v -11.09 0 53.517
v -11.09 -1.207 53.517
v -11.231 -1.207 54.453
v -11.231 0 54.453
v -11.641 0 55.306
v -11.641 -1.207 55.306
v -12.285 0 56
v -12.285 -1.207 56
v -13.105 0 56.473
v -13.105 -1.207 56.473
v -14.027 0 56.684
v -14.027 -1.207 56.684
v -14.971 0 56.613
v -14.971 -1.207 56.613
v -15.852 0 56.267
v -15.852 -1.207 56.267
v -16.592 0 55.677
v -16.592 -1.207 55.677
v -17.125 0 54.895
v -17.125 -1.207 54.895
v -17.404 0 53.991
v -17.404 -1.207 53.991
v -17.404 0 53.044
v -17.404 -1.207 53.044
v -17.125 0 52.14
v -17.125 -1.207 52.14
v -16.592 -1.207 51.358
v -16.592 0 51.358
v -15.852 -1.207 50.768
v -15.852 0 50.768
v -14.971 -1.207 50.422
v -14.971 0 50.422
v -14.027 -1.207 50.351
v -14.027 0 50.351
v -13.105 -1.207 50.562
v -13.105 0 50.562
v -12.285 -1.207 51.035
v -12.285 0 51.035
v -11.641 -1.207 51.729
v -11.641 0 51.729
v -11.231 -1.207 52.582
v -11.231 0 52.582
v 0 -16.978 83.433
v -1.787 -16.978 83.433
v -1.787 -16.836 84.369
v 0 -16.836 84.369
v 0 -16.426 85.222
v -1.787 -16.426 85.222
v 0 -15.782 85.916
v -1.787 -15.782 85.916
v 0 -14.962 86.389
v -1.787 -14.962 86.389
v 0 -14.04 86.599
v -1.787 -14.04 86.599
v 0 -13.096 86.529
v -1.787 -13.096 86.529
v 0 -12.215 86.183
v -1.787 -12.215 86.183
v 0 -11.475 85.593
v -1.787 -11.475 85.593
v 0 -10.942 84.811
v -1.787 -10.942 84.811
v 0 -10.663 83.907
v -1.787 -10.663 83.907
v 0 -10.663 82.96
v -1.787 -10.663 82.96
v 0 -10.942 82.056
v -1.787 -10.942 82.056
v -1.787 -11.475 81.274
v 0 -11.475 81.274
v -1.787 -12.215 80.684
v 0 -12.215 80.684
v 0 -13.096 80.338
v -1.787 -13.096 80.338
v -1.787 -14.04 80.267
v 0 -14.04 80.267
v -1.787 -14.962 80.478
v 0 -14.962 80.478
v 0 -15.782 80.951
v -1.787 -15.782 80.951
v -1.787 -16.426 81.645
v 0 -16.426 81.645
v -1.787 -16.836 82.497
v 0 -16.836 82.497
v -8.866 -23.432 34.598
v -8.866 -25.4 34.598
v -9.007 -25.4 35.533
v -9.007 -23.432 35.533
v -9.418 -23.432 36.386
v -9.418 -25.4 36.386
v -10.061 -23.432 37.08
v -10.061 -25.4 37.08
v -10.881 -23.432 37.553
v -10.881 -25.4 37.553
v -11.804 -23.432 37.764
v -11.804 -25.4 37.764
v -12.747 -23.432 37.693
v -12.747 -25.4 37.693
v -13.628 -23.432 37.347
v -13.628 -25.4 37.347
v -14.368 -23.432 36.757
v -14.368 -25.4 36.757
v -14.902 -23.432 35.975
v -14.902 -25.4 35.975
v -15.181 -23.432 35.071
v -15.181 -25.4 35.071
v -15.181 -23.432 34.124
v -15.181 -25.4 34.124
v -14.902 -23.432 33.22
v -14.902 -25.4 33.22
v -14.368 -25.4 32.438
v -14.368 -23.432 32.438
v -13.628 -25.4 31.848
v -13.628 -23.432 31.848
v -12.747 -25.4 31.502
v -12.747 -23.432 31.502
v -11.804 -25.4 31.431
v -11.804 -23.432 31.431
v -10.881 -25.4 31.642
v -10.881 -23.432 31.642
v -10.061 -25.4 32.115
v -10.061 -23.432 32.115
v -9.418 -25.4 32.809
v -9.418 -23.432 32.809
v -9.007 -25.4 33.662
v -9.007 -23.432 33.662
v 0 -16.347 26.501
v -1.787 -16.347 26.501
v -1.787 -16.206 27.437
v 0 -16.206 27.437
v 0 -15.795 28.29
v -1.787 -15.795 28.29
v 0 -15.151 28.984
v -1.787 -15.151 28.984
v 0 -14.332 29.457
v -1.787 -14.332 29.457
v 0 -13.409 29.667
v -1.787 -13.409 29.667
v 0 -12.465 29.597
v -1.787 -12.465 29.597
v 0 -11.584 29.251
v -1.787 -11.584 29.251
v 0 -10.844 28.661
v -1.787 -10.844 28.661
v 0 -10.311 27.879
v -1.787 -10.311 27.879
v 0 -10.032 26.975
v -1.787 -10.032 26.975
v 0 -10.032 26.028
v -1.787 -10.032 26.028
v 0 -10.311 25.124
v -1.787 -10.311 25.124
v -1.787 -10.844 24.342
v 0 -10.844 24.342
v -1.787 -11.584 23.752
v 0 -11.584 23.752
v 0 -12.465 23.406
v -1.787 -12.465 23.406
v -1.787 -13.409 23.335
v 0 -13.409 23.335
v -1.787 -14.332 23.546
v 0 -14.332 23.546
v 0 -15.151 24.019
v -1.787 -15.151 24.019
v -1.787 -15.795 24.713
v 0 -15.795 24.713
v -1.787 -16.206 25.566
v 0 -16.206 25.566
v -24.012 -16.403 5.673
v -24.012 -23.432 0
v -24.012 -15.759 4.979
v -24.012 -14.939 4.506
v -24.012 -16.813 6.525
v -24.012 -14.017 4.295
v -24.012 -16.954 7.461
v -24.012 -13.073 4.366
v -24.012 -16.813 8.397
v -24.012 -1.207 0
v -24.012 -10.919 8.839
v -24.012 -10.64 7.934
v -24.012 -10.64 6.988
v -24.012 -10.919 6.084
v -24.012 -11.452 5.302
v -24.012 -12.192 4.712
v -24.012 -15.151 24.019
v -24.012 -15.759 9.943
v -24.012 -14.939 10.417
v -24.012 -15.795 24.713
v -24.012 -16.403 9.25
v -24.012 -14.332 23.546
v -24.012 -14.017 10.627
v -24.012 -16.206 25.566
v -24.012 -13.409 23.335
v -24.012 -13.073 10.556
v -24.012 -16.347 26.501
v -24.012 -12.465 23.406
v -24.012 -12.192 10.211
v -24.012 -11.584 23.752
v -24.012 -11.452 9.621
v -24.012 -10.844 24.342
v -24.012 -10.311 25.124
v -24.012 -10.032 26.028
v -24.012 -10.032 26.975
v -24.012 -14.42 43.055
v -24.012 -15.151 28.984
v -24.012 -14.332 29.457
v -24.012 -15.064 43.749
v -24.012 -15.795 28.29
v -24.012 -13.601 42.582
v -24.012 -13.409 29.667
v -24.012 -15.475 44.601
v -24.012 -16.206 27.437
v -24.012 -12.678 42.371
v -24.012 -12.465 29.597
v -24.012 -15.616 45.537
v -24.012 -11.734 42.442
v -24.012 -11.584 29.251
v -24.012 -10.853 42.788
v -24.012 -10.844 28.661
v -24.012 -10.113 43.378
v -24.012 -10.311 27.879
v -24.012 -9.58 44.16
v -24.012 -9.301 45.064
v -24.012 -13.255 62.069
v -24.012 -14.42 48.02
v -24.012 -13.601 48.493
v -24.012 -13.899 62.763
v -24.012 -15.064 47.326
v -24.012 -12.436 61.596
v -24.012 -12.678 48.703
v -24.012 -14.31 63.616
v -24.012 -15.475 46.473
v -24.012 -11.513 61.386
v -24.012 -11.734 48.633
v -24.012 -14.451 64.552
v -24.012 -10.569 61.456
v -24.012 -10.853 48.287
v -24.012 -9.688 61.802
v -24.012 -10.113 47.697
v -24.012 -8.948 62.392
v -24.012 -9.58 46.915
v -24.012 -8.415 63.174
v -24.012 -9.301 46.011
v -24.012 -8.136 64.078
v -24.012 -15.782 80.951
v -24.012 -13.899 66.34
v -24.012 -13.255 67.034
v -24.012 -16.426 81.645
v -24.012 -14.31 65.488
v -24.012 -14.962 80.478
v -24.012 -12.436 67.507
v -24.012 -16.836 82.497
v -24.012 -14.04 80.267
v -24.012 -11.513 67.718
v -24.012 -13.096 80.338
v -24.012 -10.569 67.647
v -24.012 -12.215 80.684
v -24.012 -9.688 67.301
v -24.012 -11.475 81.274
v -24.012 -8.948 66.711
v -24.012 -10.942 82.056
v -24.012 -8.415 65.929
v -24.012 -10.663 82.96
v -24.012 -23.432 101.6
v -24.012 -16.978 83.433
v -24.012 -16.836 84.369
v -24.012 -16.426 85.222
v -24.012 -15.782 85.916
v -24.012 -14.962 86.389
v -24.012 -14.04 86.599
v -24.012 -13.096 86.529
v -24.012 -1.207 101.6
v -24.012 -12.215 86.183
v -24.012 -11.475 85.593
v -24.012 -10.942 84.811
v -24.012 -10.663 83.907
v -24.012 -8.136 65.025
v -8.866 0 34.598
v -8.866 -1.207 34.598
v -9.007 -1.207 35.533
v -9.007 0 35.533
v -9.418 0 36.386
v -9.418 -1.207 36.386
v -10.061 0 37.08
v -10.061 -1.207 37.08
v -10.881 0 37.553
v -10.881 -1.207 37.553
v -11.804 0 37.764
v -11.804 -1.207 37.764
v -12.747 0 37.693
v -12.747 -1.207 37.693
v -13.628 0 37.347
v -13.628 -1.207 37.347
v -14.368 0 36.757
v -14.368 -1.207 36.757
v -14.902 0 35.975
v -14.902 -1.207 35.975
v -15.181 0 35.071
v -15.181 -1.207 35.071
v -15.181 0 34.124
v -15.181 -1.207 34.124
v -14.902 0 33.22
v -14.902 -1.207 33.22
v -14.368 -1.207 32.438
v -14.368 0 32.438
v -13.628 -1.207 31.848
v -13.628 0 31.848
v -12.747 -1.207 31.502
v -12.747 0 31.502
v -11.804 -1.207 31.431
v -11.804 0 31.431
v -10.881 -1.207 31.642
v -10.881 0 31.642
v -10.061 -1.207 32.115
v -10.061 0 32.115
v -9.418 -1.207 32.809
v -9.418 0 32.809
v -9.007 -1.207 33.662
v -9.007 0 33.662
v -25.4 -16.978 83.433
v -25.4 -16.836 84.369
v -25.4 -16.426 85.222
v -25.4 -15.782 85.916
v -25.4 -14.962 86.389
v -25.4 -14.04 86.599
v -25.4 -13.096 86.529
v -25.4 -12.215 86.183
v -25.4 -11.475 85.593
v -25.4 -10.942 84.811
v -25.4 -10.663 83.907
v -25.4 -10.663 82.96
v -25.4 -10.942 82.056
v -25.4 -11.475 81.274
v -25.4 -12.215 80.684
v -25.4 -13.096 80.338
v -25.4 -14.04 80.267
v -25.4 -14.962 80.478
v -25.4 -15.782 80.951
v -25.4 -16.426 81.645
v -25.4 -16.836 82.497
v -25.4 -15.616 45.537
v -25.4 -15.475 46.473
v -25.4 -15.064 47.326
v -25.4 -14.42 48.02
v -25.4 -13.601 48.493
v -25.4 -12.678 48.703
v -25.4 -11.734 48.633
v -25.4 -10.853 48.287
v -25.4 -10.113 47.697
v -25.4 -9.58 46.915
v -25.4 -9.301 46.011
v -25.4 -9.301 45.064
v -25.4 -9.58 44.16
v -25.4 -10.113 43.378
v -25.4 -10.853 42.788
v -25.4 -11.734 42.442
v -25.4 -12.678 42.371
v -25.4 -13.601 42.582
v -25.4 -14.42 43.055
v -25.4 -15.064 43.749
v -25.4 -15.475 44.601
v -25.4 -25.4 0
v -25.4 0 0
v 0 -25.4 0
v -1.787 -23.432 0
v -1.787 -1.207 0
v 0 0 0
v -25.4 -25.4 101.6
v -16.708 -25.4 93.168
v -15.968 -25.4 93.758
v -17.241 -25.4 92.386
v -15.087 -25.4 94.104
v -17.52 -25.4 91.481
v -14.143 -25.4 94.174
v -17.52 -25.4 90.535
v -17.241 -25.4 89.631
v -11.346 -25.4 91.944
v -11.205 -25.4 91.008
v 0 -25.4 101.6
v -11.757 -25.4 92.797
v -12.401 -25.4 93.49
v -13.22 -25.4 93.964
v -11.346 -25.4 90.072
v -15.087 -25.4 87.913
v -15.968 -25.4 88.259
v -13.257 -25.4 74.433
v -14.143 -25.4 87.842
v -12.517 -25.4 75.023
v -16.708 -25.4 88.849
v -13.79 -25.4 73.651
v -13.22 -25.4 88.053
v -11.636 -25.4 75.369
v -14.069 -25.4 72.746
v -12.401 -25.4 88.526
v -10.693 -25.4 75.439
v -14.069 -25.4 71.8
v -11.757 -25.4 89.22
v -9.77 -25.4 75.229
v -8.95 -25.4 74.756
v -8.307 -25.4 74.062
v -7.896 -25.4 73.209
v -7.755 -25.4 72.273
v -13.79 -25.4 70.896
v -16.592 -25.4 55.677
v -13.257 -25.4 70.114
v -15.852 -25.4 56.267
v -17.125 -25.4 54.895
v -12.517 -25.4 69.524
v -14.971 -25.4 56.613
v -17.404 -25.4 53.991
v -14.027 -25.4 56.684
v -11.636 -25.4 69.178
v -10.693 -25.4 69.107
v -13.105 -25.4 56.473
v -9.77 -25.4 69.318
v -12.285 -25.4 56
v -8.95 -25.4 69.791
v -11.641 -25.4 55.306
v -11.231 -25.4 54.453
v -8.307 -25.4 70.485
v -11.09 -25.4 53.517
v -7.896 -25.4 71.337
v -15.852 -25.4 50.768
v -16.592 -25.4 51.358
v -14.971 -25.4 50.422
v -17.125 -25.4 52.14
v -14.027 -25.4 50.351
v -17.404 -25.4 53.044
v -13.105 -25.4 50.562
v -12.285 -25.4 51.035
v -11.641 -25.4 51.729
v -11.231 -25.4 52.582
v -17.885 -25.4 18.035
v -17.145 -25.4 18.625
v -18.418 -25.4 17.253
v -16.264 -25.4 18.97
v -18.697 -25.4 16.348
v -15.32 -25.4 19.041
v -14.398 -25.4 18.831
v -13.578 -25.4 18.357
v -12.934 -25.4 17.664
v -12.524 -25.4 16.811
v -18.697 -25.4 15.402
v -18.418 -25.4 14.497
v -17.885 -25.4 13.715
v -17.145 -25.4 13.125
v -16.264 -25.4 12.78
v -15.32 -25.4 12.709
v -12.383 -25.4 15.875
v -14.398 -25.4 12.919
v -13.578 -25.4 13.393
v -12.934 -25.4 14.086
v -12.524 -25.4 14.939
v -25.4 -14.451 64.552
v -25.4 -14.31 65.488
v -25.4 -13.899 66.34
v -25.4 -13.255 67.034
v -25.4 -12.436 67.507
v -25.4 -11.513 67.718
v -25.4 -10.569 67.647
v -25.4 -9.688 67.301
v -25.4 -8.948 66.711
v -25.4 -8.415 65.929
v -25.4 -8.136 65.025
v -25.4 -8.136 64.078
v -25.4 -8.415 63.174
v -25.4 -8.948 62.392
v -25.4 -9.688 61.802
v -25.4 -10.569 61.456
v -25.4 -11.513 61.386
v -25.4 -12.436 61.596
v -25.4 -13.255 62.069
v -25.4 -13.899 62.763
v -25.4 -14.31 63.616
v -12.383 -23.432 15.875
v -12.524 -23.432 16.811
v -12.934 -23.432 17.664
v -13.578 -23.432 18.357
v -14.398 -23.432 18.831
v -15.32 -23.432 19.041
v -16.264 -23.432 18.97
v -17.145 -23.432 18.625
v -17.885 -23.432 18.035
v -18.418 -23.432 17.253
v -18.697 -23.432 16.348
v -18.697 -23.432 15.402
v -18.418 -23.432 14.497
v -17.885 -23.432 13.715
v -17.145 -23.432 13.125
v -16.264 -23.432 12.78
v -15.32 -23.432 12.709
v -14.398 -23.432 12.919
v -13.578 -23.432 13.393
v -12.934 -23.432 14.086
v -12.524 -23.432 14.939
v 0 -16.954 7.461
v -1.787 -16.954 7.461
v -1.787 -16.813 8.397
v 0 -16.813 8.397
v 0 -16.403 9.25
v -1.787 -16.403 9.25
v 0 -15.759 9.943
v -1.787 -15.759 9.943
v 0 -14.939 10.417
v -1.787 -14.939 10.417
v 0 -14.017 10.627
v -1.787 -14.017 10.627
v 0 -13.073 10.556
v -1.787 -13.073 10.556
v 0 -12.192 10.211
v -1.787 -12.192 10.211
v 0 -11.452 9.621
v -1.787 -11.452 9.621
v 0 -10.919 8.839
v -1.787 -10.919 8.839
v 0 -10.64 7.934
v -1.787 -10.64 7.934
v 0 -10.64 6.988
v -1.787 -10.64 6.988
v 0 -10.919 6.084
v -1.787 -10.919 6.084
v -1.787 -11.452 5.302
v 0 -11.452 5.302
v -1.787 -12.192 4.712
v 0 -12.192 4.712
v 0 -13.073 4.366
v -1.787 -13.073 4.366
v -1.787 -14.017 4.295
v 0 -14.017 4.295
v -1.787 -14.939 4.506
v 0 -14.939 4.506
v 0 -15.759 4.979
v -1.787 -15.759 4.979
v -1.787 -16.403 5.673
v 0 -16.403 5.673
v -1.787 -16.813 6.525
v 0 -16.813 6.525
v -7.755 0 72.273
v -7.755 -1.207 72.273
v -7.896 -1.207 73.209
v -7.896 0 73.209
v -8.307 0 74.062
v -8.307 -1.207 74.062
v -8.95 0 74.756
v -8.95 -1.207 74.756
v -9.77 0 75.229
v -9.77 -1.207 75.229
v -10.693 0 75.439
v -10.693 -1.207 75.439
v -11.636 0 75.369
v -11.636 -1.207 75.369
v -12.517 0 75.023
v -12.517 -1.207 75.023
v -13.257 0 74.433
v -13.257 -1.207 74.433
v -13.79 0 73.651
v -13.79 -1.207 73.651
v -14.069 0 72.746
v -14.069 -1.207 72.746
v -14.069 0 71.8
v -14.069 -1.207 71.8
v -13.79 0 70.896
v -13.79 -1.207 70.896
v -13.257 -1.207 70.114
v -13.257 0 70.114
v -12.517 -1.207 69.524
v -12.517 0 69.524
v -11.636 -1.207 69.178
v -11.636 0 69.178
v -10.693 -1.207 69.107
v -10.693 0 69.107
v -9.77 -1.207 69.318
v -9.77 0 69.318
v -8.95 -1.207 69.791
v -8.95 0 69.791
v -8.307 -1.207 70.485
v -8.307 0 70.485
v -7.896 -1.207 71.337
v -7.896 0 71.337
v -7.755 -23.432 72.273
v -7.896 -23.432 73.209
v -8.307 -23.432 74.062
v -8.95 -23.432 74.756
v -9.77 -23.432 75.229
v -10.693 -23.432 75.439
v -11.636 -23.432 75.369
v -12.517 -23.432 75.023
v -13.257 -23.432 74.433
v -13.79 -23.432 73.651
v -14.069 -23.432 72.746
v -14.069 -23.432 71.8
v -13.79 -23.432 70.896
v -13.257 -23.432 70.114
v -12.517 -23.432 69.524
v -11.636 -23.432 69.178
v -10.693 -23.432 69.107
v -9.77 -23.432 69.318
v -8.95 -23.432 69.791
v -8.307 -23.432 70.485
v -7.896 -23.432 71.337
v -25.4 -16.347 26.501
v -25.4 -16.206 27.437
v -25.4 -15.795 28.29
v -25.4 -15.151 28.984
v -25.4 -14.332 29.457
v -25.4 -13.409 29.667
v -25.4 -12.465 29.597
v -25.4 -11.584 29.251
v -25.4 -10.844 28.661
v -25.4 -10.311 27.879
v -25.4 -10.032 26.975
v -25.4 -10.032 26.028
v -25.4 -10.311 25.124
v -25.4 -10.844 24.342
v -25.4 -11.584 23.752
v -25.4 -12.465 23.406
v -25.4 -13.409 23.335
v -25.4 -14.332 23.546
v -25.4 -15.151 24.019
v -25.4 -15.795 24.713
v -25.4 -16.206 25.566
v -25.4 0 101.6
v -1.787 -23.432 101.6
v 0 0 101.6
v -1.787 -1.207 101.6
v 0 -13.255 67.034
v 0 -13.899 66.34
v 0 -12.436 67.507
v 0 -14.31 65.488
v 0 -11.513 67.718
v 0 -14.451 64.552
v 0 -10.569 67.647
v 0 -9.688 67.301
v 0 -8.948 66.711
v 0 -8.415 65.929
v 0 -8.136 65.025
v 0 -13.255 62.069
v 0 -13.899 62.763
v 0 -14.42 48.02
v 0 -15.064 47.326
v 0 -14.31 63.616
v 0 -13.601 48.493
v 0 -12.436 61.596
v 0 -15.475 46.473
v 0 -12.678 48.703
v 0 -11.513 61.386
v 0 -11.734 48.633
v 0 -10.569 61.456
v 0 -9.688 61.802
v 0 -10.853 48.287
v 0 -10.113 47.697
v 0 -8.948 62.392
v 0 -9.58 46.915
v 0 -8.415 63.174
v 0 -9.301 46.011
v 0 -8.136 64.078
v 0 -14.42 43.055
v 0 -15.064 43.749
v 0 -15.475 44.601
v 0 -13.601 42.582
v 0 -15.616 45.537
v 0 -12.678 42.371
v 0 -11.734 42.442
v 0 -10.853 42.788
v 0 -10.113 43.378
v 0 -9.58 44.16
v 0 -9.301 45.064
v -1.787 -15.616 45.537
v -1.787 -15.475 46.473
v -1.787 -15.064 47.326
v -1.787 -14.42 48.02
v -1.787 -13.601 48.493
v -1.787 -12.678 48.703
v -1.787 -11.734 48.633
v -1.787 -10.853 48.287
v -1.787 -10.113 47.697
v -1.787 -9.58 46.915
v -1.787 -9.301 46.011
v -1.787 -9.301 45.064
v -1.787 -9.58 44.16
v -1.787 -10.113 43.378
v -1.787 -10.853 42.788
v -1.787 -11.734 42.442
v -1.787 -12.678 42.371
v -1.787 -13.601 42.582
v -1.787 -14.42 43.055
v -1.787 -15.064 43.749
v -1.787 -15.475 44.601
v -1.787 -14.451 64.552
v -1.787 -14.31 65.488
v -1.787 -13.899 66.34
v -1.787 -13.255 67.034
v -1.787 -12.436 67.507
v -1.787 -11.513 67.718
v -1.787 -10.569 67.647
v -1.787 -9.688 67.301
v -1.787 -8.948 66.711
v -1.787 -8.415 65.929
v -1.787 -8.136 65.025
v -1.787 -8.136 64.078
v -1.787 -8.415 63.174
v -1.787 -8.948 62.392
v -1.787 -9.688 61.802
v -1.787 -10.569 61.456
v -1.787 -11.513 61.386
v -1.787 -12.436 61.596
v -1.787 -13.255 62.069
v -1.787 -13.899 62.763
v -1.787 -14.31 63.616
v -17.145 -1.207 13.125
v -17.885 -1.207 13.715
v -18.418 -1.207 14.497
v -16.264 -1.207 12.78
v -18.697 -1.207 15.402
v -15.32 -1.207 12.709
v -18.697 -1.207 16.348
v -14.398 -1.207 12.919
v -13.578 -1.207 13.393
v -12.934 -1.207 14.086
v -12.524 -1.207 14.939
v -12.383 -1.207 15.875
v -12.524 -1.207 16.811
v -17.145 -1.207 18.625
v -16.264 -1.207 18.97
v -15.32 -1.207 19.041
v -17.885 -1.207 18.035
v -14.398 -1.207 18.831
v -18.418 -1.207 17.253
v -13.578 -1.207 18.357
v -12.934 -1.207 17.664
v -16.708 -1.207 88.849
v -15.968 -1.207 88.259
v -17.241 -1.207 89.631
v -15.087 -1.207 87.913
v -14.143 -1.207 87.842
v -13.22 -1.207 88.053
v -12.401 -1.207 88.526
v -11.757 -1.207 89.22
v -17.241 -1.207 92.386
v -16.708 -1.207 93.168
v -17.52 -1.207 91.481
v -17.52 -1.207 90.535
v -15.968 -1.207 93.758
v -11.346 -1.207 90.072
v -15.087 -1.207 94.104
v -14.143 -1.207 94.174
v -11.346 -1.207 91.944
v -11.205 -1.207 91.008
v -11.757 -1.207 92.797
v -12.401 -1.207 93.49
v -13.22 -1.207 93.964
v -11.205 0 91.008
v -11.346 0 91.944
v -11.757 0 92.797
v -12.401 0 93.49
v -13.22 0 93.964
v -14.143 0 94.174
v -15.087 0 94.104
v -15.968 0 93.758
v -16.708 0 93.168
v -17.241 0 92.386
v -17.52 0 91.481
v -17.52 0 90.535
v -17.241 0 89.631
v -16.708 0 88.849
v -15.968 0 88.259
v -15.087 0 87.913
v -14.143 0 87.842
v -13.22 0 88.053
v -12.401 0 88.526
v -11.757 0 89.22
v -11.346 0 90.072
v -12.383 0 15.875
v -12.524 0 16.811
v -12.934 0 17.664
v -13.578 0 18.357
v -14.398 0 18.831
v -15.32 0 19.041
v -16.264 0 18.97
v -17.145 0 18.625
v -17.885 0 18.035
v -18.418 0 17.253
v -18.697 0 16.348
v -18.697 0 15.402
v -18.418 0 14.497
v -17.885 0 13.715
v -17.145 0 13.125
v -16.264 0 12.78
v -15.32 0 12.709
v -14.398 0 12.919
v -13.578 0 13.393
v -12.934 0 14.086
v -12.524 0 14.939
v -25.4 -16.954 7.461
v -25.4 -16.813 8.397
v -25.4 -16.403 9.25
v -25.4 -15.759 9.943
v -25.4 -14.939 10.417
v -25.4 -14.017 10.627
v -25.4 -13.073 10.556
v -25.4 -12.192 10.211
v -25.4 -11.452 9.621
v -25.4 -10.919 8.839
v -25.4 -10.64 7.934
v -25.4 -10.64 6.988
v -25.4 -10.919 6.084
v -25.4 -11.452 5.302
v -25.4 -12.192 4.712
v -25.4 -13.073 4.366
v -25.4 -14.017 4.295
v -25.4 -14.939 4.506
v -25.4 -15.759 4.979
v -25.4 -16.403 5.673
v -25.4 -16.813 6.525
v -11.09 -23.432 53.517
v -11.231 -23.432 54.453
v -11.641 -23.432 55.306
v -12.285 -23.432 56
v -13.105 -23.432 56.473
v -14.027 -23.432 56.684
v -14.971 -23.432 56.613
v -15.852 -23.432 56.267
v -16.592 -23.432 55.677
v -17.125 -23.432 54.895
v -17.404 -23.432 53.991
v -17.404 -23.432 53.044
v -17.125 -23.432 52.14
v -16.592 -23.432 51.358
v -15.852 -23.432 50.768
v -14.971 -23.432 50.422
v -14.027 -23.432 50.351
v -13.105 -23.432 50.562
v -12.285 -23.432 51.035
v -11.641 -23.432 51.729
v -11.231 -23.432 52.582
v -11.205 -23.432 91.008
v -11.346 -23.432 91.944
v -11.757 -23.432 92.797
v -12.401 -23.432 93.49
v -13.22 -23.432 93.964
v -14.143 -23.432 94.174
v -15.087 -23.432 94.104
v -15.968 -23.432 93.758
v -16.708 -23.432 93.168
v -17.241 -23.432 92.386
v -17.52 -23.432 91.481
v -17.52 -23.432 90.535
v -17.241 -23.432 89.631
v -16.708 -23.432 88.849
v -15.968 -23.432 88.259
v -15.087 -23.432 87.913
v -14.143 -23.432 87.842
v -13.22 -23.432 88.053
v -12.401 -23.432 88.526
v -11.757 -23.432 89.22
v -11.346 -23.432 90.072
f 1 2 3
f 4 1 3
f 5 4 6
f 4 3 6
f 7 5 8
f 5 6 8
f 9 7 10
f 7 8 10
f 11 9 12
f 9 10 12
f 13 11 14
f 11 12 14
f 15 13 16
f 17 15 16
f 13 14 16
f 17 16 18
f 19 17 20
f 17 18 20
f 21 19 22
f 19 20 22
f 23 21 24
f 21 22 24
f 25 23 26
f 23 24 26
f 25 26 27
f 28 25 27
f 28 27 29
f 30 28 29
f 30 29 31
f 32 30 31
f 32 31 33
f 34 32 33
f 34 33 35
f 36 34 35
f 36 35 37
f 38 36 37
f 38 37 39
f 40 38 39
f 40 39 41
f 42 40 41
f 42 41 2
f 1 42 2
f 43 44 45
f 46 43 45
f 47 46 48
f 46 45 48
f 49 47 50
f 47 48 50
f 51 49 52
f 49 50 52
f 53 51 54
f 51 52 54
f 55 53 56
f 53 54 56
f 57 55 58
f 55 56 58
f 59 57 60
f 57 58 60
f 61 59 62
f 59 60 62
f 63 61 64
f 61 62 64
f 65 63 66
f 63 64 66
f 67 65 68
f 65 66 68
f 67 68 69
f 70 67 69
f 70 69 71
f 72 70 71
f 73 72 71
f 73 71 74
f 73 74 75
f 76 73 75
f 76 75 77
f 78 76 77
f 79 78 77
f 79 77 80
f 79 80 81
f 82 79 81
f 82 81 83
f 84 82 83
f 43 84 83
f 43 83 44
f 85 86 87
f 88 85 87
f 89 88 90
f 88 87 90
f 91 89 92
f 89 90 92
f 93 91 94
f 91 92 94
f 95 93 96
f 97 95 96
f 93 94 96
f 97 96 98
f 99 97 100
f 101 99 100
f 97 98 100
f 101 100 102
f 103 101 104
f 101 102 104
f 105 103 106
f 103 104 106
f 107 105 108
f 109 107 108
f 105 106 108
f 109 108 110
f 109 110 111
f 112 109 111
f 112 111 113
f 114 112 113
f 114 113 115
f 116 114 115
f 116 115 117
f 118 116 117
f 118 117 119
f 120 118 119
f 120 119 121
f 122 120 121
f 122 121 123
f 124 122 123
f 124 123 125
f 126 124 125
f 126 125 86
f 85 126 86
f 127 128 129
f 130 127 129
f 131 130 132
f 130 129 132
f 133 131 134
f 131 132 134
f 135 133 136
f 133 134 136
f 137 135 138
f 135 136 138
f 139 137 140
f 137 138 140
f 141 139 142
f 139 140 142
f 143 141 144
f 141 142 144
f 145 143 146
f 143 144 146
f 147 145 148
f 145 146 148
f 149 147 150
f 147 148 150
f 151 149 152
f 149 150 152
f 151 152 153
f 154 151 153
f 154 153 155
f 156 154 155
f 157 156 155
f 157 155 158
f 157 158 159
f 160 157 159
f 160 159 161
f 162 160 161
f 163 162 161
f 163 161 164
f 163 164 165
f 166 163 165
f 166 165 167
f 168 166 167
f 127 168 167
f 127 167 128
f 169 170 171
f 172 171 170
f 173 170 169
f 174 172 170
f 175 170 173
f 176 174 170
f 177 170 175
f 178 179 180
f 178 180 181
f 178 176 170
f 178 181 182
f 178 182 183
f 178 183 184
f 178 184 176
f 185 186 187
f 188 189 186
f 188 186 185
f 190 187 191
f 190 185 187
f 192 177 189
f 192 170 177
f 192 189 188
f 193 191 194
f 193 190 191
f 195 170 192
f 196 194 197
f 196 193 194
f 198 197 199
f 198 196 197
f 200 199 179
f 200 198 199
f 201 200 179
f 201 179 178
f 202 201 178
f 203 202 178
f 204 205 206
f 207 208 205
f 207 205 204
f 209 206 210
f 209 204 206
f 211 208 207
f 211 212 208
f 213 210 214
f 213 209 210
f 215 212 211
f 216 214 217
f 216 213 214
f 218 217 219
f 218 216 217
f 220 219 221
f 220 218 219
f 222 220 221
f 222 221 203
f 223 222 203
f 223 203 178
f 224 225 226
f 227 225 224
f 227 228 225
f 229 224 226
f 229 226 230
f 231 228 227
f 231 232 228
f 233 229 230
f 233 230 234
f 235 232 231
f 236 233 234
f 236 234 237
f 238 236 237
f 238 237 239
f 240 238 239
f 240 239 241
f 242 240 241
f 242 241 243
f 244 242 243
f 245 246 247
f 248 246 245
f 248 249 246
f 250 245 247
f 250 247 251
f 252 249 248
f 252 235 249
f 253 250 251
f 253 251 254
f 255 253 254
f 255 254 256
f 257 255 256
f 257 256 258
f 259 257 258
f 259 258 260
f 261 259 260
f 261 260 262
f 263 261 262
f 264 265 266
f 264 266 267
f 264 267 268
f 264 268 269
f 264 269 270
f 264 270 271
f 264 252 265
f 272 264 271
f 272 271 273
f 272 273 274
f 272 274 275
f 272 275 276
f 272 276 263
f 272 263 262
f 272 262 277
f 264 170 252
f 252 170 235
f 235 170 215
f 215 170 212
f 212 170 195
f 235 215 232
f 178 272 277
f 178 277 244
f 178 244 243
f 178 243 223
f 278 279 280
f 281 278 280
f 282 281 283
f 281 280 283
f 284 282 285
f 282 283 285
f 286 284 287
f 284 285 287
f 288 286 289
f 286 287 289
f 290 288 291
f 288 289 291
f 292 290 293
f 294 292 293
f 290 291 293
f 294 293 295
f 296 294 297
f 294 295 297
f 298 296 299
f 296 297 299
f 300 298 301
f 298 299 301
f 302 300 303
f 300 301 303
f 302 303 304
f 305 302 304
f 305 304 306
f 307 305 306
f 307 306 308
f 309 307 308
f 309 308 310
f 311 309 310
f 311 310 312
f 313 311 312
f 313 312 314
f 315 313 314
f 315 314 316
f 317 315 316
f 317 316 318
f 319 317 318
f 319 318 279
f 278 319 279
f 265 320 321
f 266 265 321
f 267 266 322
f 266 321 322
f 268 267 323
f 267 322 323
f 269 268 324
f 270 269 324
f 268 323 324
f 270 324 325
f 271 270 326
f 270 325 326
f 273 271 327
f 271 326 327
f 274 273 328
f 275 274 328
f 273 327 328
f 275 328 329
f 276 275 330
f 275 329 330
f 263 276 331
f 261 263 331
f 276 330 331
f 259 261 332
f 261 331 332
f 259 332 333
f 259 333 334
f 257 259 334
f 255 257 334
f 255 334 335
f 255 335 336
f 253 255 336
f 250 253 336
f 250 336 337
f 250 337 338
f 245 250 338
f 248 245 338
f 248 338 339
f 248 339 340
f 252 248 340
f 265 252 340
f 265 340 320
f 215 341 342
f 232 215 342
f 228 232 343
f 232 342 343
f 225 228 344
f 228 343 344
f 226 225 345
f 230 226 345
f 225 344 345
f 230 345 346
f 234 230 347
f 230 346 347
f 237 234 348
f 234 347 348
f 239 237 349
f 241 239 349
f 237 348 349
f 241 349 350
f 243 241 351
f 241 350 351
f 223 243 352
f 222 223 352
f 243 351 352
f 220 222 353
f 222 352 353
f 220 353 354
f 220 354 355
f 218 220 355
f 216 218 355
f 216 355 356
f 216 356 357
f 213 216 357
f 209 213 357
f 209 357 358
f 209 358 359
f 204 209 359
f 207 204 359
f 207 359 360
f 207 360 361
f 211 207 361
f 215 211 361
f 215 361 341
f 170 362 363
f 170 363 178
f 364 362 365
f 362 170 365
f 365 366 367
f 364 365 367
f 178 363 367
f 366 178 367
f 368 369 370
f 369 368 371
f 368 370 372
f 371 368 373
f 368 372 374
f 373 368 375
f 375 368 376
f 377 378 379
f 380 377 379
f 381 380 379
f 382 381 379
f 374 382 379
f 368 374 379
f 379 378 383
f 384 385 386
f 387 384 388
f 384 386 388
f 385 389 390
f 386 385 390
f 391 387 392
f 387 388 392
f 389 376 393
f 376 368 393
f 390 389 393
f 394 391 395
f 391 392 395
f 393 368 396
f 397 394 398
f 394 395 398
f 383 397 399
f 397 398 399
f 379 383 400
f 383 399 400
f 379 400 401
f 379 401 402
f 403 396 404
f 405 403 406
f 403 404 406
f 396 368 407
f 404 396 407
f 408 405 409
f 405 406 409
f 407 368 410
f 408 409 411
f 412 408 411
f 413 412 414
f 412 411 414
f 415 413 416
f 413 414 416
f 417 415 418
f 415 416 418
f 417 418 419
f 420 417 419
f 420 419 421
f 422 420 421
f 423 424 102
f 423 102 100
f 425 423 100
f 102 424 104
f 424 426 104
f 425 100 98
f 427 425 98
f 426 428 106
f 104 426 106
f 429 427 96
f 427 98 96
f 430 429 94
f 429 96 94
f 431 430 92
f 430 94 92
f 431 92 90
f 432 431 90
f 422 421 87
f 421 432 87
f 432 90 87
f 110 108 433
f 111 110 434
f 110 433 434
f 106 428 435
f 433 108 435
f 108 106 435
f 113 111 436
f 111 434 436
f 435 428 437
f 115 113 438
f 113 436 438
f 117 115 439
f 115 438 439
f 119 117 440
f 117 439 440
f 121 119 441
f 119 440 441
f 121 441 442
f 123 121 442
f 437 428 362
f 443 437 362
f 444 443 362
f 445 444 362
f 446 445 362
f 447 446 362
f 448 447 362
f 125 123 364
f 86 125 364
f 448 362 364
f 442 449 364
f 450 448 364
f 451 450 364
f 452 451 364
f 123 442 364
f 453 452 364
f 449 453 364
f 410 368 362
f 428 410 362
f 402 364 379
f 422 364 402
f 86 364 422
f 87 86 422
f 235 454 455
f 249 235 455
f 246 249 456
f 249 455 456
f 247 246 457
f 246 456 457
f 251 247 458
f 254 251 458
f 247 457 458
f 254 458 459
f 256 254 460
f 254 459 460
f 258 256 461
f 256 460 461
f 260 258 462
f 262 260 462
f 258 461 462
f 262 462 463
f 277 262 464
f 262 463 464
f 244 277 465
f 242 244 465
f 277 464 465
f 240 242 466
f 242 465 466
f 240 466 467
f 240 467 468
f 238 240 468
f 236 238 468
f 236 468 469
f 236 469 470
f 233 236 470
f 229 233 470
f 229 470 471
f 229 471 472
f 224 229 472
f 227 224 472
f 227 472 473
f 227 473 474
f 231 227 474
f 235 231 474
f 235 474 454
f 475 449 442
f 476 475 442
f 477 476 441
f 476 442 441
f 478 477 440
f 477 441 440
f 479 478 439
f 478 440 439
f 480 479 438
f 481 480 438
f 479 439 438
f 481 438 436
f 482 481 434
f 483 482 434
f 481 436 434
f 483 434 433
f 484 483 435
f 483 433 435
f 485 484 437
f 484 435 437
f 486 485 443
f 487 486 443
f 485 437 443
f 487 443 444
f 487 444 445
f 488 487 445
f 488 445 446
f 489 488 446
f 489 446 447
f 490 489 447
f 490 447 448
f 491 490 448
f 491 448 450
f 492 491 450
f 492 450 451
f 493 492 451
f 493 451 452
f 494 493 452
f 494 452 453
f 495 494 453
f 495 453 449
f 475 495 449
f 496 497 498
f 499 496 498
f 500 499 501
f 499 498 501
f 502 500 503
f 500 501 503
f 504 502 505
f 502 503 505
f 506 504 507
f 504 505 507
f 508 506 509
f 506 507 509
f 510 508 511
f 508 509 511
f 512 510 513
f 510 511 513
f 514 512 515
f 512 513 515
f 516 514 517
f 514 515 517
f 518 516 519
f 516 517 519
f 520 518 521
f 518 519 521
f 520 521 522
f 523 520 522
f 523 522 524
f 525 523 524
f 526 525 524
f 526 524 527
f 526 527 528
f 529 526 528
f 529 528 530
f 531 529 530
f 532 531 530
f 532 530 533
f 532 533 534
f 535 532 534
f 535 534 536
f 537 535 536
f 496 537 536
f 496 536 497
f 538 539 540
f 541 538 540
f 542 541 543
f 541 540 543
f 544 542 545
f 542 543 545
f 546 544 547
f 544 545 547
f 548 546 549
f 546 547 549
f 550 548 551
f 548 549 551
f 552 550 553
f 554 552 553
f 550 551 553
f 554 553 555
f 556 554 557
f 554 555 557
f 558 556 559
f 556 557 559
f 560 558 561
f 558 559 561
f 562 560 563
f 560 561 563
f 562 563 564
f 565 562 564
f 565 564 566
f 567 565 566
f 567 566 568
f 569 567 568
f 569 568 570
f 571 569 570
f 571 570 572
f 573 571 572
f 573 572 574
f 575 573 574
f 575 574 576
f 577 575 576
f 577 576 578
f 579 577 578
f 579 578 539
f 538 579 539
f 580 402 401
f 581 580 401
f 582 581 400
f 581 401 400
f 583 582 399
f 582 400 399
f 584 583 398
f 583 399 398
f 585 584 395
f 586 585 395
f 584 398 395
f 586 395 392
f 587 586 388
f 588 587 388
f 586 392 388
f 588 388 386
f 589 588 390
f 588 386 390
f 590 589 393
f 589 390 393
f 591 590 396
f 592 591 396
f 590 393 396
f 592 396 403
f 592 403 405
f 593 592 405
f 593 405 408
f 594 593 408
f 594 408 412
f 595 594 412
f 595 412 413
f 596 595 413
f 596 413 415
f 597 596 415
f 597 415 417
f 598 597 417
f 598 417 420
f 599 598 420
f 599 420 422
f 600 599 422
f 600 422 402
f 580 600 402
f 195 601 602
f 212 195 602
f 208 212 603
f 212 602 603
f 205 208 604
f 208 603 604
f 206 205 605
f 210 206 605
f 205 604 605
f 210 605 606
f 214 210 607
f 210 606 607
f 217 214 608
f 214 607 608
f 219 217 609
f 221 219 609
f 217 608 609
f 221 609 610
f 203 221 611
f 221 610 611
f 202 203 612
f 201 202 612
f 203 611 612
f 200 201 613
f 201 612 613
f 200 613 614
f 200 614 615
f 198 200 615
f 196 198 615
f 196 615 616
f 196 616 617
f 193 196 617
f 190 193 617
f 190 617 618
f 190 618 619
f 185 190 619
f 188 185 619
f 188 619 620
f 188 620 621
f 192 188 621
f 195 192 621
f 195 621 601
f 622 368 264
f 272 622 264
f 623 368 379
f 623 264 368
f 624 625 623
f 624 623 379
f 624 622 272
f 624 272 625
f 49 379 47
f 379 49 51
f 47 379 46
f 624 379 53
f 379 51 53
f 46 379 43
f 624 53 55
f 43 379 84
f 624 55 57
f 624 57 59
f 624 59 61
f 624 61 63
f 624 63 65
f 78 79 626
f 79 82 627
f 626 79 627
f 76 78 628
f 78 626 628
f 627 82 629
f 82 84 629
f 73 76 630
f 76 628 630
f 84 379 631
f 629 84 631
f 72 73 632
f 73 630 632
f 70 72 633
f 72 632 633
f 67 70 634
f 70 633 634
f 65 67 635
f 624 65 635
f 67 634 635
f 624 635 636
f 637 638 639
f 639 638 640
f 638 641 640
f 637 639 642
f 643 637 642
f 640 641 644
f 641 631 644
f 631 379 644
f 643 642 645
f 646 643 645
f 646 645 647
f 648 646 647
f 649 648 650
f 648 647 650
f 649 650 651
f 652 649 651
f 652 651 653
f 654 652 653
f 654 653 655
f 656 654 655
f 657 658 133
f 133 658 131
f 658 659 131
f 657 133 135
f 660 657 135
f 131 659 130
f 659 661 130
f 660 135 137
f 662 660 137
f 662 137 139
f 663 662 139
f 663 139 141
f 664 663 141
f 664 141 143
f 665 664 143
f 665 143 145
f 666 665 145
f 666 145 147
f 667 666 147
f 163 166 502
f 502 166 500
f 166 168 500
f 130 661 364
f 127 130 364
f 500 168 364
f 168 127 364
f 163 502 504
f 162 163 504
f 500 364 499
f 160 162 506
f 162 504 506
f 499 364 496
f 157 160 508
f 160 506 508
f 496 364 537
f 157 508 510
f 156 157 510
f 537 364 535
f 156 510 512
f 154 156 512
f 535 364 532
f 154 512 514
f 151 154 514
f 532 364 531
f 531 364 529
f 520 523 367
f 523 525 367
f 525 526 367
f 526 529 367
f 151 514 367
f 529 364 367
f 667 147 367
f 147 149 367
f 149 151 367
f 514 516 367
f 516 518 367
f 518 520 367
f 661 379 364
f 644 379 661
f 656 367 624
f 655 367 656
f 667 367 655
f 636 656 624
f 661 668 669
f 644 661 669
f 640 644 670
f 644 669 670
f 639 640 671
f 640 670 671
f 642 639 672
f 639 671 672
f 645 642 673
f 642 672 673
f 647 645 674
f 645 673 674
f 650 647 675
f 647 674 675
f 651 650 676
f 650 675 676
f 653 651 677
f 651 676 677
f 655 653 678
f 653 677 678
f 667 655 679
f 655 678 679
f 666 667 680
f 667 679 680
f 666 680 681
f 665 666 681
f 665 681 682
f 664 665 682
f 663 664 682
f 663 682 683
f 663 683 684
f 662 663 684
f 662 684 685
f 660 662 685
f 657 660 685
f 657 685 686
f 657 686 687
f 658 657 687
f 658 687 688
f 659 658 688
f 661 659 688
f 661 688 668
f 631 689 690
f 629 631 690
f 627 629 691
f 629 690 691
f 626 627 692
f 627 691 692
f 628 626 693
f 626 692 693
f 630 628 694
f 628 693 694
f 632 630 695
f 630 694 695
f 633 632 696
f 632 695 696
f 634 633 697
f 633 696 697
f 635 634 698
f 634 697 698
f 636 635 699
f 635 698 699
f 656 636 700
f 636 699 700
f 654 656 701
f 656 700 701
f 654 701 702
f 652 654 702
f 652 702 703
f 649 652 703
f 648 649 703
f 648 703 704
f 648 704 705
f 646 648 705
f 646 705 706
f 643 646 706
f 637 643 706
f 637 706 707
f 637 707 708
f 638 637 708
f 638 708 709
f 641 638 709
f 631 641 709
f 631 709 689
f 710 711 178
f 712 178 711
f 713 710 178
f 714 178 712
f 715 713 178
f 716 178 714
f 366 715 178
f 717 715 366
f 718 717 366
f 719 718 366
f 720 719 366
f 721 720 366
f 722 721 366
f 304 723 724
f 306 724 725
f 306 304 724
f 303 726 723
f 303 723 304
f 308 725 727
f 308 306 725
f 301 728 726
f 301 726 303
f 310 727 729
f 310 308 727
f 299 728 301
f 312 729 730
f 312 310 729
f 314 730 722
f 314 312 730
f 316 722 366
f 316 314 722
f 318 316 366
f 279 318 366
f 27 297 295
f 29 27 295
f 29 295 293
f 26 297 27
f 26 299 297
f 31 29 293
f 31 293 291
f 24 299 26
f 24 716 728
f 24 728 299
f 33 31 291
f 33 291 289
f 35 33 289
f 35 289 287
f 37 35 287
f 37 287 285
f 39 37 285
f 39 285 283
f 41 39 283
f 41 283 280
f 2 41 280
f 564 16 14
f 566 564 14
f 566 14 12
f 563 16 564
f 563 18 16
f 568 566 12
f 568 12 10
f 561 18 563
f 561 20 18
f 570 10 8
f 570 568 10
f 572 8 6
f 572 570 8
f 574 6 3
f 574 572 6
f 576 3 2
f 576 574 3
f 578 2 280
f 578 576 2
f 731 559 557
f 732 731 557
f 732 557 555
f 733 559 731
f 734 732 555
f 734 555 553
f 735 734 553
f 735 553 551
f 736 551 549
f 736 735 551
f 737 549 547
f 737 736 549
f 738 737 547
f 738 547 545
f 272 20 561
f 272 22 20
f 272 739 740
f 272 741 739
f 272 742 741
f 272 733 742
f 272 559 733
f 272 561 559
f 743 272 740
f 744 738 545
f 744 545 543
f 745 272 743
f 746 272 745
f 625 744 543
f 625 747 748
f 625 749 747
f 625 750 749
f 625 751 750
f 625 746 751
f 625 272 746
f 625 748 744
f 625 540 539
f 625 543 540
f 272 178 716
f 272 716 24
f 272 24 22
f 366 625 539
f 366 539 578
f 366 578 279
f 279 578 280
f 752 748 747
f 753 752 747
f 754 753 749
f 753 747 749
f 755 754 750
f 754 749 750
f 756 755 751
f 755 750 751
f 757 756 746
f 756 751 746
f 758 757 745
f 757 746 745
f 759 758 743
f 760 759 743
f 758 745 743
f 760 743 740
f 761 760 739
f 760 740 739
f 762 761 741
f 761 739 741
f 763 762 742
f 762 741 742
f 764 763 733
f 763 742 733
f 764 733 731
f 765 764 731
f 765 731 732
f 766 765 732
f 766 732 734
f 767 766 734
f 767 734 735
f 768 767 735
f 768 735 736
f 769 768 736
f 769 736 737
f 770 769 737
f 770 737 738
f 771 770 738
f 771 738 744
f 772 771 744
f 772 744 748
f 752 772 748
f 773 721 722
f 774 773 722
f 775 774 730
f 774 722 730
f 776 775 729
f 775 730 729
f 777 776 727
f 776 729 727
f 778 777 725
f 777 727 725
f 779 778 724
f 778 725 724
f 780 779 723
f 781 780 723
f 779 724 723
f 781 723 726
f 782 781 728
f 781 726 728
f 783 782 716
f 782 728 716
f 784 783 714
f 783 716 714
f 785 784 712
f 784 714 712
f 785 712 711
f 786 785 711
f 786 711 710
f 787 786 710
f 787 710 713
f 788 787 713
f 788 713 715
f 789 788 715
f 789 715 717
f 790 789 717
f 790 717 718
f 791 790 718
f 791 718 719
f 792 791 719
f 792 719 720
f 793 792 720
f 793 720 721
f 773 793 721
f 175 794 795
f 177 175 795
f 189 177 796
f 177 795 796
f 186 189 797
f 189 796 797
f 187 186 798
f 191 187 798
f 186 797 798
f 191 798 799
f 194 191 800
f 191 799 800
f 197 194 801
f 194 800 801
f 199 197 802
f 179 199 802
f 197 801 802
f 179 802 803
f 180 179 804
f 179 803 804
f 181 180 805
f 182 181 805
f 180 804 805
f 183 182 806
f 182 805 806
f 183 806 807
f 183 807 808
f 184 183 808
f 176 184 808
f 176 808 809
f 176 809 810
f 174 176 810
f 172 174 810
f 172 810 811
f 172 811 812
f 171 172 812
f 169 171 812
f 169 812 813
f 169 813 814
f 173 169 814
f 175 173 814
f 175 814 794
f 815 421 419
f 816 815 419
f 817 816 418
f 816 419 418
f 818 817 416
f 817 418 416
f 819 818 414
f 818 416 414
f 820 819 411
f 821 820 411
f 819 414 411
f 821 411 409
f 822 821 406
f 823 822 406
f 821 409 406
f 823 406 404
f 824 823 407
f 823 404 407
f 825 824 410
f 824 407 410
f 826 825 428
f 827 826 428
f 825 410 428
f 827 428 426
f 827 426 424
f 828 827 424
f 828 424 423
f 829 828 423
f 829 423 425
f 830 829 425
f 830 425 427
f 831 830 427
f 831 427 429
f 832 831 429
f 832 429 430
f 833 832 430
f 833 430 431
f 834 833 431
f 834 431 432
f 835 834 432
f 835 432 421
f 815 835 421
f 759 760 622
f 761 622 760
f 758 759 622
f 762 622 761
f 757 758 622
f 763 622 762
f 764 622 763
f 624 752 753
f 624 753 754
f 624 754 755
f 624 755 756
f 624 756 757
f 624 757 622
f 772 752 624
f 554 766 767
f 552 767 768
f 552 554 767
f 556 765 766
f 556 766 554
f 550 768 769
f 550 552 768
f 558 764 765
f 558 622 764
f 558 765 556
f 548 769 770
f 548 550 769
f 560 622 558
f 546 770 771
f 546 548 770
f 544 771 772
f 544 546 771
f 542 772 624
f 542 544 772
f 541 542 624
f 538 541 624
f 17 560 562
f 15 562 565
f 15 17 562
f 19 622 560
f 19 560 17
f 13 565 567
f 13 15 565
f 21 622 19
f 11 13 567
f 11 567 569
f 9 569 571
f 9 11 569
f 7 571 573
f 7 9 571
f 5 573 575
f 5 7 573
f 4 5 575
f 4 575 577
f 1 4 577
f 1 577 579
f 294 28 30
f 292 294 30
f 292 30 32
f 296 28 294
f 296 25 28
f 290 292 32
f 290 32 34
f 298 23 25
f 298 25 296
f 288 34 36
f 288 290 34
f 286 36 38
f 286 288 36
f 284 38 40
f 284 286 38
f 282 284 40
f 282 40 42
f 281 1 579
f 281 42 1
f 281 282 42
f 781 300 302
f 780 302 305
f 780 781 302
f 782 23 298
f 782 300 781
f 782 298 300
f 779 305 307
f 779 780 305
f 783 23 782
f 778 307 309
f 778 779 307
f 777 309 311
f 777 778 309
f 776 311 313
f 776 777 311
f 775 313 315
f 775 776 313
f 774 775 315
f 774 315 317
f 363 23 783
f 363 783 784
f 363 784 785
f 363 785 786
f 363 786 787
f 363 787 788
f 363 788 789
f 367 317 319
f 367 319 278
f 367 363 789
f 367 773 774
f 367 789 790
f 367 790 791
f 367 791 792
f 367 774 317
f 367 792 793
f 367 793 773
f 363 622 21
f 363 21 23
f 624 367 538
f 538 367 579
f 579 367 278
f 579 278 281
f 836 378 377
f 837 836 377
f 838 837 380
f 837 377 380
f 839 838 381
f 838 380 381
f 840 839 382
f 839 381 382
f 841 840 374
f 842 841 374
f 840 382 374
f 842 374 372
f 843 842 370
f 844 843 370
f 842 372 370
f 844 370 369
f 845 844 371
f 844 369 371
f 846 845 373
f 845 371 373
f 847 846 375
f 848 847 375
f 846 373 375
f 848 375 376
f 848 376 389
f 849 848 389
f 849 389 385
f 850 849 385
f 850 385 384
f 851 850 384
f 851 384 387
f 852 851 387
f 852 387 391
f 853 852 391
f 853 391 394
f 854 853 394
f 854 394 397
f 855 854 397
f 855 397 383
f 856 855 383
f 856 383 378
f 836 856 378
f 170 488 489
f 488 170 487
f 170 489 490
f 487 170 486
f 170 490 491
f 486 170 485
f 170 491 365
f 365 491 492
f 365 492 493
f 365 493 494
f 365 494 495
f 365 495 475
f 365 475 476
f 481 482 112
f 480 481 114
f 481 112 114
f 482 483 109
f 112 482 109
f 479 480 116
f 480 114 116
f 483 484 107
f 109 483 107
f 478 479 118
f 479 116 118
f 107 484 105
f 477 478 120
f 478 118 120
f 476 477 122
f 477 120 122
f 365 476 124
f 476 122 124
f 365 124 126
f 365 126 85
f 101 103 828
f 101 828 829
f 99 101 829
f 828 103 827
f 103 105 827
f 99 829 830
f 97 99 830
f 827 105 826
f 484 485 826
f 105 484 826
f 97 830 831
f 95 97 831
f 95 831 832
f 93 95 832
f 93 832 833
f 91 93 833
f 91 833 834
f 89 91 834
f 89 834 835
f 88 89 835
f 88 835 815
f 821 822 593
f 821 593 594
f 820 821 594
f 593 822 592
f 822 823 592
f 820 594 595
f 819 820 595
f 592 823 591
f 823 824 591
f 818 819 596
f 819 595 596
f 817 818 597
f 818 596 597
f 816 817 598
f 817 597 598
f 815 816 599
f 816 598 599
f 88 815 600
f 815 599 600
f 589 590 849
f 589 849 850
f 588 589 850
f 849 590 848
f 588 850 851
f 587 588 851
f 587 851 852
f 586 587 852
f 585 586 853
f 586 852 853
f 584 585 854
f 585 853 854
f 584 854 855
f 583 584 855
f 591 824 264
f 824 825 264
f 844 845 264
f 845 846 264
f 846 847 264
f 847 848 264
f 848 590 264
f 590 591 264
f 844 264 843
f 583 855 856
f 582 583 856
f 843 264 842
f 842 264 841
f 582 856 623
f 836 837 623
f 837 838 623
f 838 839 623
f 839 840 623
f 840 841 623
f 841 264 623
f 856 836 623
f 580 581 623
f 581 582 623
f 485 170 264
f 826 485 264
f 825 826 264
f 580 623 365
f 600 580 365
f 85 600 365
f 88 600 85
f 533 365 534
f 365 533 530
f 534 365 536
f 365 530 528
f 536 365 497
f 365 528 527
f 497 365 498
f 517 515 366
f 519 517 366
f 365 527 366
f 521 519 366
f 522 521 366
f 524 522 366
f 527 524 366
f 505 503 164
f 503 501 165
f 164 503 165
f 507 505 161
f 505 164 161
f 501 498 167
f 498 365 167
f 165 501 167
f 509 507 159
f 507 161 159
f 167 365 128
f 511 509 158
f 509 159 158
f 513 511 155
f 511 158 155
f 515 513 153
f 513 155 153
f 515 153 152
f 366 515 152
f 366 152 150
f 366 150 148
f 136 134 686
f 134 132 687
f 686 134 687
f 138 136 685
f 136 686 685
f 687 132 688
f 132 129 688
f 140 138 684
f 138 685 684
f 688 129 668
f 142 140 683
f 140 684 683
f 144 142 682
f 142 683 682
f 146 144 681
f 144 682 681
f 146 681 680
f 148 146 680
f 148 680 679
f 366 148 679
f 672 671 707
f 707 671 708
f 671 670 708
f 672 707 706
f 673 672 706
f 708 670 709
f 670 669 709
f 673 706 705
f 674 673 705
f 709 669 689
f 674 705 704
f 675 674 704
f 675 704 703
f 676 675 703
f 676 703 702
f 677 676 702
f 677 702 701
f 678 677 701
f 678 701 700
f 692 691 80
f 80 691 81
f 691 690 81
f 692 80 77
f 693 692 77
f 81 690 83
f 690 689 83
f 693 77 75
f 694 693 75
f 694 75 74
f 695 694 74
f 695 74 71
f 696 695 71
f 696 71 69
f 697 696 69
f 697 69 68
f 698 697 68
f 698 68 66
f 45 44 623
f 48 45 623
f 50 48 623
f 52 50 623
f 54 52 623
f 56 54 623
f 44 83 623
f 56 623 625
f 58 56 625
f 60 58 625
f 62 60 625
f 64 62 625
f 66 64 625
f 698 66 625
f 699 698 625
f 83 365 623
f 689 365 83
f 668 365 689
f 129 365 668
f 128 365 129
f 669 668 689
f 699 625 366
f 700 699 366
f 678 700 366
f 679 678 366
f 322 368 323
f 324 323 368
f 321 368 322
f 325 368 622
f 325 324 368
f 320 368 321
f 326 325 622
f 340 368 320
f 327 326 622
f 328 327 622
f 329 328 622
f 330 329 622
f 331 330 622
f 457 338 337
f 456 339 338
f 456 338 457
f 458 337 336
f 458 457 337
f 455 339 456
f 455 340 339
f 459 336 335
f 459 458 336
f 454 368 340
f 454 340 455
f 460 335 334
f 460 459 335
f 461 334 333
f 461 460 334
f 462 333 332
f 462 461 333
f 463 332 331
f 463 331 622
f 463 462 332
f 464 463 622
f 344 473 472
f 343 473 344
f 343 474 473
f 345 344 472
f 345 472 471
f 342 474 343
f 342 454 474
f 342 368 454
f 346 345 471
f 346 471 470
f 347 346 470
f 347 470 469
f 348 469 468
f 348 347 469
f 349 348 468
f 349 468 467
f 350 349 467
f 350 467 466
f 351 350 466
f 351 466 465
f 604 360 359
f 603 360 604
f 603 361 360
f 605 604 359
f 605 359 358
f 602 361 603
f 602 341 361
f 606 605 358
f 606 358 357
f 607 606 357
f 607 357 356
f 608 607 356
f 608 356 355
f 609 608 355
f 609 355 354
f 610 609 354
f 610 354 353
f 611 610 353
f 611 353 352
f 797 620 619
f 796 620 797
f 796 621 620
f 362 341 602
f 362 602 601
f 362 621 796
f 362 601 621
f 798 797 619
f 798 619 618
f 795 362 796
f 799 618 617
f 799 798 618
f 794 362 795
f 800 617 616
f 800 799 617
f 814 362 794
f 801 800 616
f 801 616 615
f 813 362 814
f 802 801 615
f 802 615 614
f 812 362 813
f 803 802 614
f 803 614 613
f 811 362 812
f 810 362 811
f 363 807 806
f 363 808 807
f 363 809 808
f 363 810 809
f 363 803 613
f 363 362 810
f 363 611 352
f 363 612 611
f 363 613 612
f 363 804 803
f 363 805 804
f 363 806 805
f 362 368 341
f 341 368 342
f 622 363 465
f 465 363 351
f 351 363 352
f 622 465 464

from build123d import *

# Parameters (mm, degrees)
F0_W      = 25.4
F0_H      = 25.4
F1_DEPTH  = 101.6
F2_W      = 22.225
F2_H      = 22.225
F3_DEPTH  = 101.6
F4_R      = 3.174802
F5_DEPTH  = 25.4
F6_R      = 3.175
F7_DEPTH  = 25.4
F8_R      = 3.175
F9_DEPTH  = 25.4
F10_R     = 3.175
F11_DEPTH = 25.4
F12_R     = 3.175
F13_DEPTH = 25.4
F14_R     = 3.175
F15_DEPTH = 25.4
F16_R     = 3.175
F17_DEPTH = 25.4
F18_R     = 3.175
F19_DEPTH = 25.4
F20_R     = 3.175
F21_DEPTH = 25.4
F22_R     = 3.175
F23_DEPTH = 25.4


with BuildPart() as f1:
    # F0 (on Top) → F1 (new body)
    with BuildSketch(Plane.XY):
        with Locations((-12.7, -12.7)):
            Rectangle(F0_W, F0_H)
    extrude(amount=F1_DEPTH)

    # F2 (on face) → F3 (cut)
    with BuildSketch(Plane.XY.offset(101.6)):
        with Locations((-12.899866, -12.319956)):
            Rectangle(F2_W, F2_H)
    extrude(amount=-F3_DEPTH, mode=Mode.SUBTRACT)

    # F4 (on face) → F5 (cut)
    with BuildSketch(Plane(origin=(-25.4, 0, 0), x_dir=(0, -1, 0), z_dir=(-1, 0, 0))):
        with Locations((13.779499, 7.461248)):
            Circle(F4_R)
    extrude(amount=-F5_DEPTH, mode=Mode.SUBTRACT)

    # F6 (on face) → F7 (cut)
    with BuildSketch(Plane(origin=(-25.4, 0, 0), x_dir=(0, -1, 0), z_dir=(-1, 0, 0))):
        with Locations((13.171837, 26.501355)):
            Circle(F6_R)
    extrude(amount=-F7_DEPTH, mode=Mode.SUBTRACT)

    # F8 (on face) → F9 (cut)
    with BuildSketch(Plane(origin=(-25.4, 0, 0), x_dir=(0, -1, 0), z_dir=(-1, 0, 0))):
        with Locations((12.4406, 45.537316)):
            Circle(F8_R)
    extrude(amount=-F9_DEPTH, mode=Mode.SUBTRACT)

    # F10 (on face) → F11 (cut)
    with BuildSketch(Plane(origin=(-25.4, 0, 0), x_dir=(0, -1, 0), z_dir=(-1, 0, 0))):
        with Locations((11.275698, 64.551666)):
            Circle(F10_R)
    extrude(amount=-F11_DEPTH, mode=Mode.SUBTRACT)

    # F12 (on face) → F13 (cut)
    with BuildSketch(Plane(origin=(-25.4, 0, 0), x_dir=(0, -1, 0), z_dir=(-1, 0, 0))):
        with Locations((13.80254, 83.433339)):
            Circle(F12_R)
    extrude(amount=-F13_DEPTH, mode=Mode.SUBTRACT)

    # F14 (on face) → F15 (cut)
    with BuildSketch(Plane.XZ.offset(25.4)):
        with Locations((-15.557501, 15.875)):
            Circle(F14_R)
    extrude(amount=-F15_DEPTH, mode=Mode.SUBTRACT)

    # F16 (on face) → F17 (cut)
    with BuildSketch(Plane.XZ.offset(25.4)):
        with Locations((-12.04097, 34.59762)):
            Circle(F16_R)
    extrude(amount=-F17_DEPTH, mode=Mode.SUBTRACT)

    # F18 (on face) → F19 (cut)
    with BuildSketch(Plane.XZ.offset(25.4)):
        with Locations((-14.264603, 53.517397)):
            Circle(F18_R)
    extrude(amount=-F19_DEPTH, mode=Mode.SUBTRACT)

    # F20 (on face) → F21 (cut)
    with BuildSketch(Plane.XZ.offset(25.4)):
        with Locations((-10.92981, 72.27324)):
            Circle(F20_R)
    extrude(amount=-F21_DEPTH, mode=Mode.SUBTRACT)

    # F22 (on face) → F23 (cut)
    with BuildSketch(Plane.XZ.offset(25.4)):
        with Locations((-14.380366, 91.008132)):
            Circle(F22_R)
    extrude(amount=-F23_DEPTH, mode=Mode.SUBTRACT)


solid = f1.part
